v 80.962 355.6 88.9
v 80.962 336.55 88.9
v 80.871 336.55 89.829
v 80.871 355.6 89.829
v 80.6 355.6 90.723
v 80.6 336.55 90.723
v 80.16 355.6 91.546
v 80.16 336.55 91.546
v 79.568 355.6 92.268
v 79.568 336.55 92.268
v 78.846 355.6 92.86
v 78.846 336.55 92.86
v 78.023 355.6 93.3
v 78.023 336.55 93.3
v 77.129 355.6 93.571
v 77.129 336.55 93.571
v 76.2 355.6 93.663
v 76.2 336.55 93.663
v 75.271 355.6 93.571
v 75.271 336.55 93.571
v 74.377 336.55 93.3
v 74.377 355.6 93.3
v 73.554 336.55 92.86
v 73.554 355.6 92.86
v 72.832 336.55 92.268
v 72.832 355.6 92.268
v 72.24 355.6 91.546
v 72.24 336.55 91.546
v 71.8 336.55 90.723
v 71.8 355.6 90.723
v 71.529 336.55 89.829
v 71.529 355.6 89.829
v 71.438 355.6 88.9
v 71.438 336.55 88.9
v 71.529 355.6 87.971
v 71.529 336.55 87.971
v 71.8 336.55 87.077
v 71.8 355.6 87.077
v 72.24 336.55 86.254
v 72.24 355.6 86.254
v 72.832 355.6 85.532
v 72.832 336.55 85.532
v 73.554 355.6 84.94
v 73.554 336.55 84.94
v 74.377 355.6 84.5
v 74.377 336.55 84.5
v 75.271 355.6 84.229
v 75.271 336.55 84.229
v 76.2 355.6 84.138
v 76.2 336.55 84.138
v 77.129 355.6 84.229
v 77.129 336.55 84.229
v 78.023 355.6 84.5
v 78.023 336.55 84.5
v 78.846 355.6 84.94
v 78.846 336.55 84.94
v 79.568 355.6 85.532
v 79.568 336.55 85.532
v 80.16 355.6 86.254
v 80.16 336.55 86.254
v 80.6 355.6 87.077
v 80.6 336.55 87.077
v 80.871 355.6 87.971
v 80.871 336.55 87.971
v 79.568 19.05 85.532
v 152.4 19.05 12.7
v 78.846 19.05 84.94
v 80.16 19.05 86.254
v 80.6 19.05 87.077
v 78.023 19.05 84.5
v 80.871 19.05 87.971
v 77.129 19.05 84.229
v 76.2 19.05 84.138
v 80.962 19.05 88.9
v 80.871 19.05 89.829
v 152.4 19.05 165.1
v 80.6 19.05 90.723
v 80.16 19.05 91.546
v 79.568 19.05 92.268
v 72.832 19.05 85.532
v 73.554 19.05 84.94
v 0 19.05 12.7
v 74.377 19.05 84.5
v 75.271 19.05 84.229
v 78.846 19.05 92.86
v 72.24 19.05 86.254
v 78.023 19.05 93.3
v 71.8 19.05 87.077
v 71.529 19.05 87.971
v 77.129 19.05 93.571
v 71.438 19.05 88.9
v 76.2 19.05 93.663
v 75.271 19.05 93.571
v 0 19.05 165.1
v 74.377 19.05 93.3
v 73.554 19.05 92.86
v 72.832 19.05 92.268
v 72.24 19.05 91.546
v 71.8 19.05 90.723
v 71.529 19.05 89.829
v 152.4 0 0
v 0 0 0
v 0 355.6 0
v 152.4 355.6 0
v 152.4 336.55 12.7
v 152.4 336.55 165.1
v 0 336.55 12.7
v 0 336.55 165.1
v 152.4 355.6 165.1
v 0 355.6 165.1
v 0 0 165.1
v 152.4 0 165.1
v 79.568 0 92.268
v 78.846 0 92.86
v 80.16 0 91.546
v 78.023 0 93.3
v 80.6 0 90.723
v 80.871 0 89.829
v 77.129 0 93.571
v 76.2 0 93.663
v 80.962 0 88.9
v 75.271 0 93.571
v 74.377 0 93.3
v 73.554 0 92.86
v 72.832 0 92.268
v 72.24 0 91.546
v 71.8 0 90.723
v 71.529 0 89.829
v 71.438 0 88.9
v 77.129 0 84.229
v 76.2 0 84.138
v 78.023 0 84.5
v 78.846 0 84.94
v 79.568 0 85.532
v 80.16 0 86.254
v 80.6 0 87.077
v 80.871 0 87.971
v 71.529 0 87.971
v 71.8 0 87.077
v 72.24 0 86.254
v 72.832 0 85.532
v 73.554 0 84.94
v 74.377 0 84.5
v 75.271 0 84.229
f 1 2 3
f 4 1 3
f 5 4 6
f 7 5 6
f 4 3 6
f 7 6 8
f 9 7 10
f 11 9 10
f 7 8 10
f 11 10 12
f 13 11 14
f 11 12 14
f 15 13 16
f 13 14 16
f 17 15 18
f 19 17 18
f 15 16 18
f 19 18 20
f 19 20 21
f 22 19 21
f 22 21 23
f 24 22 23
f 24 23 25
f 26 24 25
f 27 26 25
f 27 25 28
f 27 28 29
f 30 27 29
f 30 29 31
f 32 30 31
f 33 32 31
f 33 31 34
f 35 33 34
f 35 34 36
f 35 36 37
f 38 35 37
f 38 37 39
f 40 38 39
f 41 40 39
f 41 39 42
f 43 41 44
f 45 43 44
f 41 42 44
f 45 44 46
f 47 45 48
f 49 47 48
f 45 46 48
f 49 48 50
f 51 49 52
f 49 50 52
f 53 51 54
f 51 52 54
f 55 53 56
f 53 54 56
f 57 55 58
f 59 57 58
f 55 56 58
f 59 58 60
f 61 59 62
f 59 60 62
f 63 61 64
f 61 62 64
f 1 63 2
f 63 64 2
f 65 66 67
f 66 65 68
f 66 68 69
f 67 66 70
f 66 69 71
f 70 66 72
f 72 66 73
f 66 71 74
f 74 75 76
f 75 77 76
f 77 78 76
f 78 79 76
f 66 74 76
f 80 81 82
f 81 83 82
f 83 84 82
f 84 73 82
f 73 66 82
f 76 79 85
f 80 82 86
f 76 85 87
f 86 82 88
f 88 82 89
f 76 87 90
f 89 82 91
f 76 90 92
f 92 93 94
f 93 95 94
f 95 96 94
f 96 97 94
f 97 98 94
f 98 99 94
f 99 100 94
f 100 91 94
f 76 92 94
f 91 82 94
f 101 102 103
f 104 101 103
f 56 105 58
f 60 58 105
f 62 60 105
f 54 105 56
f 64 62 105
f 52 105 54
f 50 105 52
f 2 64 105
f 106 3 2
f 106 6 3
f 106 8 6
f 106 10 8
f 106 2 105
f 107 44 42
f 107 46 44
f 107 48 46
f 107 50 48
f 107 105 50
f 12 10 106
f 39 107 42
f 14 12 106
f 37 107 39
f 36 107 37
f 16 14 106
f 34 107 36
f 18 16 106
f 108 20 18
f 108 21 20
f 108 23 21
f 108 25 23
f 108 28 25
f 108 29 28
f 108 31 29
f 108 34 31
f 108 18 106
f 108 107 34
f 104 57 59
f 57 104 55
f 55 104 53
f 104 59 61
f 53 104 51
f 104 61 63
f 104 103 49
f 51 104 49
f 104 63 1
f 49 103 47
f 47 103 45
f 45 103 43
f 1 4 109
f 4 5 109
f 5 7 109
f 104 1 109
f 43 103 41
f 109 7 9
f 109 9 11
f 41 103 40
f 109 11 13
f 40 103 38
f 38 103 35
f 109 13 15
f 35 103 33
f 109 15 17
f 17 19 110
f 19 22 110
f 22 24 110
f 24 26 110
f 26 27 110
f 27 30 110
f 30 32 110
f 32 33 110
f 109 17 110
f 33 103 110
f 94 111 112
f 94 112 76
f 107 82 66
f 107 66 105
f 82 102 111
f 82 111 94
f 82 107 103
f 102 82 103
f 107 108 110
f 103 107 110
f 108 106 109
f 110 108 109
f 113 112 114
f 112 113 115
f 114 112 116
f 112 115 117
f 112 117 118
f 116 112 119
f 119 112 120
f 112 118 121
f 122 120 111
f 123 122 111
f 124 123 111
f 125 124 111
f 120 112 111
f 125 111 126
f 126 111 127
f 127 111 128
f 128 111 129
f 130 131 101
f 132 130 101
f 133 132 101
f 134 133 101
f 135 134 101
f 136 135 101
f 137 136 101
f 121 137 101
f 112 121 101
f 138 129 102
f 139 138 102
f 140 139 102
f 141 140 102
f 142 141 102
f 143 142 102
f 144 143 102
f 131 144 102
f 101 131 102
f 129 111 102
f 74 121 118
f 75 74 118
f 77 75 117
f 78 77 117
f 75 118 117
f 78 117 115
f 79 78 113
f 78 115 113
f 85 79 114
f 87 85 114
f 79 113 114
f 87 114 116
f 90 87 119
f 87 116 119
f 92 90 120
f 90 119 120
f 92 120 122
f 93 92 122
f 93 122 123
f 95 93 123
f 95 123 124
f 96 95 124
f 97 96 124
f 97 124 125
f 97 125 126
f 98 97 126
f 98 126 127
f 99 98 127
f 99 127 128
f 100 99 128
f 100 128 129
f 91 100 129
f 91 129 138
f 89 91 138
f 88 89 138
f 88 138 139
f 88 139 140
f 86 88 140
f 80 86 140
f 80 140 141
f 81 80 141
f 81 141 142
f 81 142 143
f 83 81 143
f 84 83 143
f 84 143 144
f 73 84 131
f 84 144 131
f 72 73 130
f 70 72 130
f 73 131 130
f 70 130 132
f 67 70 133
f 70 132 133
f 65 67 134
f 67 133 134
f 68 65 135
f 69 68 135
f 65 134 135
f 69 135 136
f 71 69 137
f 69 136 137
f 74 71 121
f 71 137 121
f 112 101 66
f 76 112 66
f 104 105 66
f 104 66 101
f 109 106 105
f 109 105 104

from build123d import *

# Parameters (mm, degrees)
F0_W     = 19.05
F0_H     = 152.4
F0_H_2   = 12.7
F0_W_2   = 317.5
F1_DEPTH = 152.4
F2_R     = 4.7625
F3_DEPTH = 406.4


with BuildPart() as f1:
    # F0 (on Right) → F1 (new body)
    with BuildSketch(Plane.YZ):
        with Locations((9.525, 88.9)):
            Rectangle(F0_W, F0_H)
        with Locations((9.525, 6.35)):
            Rectangle(F0_W, F0_H_2)
        with Locations((177.8, 6.35)):
            Rectangle(F0_W_2, F0_H_2)
        with Locations((346.075, 88.9)):
            Rectangle(F0_W, F0_H)
        with Locations((346.075, 6.35)):
            Rectangle(F0_W, F0_H_2)
    extrude(amount=F1_DEPTH)

    # F2 (on Front) → F3 (cut)
    with BuildSketch(Plane.XZ):
        with Locations((76.2, 88.9)):
            Circle(F2_R)
    extrude(amount=-F3_DEPTH, mode=Mode.SUBTRACT)


solid = f1.part
